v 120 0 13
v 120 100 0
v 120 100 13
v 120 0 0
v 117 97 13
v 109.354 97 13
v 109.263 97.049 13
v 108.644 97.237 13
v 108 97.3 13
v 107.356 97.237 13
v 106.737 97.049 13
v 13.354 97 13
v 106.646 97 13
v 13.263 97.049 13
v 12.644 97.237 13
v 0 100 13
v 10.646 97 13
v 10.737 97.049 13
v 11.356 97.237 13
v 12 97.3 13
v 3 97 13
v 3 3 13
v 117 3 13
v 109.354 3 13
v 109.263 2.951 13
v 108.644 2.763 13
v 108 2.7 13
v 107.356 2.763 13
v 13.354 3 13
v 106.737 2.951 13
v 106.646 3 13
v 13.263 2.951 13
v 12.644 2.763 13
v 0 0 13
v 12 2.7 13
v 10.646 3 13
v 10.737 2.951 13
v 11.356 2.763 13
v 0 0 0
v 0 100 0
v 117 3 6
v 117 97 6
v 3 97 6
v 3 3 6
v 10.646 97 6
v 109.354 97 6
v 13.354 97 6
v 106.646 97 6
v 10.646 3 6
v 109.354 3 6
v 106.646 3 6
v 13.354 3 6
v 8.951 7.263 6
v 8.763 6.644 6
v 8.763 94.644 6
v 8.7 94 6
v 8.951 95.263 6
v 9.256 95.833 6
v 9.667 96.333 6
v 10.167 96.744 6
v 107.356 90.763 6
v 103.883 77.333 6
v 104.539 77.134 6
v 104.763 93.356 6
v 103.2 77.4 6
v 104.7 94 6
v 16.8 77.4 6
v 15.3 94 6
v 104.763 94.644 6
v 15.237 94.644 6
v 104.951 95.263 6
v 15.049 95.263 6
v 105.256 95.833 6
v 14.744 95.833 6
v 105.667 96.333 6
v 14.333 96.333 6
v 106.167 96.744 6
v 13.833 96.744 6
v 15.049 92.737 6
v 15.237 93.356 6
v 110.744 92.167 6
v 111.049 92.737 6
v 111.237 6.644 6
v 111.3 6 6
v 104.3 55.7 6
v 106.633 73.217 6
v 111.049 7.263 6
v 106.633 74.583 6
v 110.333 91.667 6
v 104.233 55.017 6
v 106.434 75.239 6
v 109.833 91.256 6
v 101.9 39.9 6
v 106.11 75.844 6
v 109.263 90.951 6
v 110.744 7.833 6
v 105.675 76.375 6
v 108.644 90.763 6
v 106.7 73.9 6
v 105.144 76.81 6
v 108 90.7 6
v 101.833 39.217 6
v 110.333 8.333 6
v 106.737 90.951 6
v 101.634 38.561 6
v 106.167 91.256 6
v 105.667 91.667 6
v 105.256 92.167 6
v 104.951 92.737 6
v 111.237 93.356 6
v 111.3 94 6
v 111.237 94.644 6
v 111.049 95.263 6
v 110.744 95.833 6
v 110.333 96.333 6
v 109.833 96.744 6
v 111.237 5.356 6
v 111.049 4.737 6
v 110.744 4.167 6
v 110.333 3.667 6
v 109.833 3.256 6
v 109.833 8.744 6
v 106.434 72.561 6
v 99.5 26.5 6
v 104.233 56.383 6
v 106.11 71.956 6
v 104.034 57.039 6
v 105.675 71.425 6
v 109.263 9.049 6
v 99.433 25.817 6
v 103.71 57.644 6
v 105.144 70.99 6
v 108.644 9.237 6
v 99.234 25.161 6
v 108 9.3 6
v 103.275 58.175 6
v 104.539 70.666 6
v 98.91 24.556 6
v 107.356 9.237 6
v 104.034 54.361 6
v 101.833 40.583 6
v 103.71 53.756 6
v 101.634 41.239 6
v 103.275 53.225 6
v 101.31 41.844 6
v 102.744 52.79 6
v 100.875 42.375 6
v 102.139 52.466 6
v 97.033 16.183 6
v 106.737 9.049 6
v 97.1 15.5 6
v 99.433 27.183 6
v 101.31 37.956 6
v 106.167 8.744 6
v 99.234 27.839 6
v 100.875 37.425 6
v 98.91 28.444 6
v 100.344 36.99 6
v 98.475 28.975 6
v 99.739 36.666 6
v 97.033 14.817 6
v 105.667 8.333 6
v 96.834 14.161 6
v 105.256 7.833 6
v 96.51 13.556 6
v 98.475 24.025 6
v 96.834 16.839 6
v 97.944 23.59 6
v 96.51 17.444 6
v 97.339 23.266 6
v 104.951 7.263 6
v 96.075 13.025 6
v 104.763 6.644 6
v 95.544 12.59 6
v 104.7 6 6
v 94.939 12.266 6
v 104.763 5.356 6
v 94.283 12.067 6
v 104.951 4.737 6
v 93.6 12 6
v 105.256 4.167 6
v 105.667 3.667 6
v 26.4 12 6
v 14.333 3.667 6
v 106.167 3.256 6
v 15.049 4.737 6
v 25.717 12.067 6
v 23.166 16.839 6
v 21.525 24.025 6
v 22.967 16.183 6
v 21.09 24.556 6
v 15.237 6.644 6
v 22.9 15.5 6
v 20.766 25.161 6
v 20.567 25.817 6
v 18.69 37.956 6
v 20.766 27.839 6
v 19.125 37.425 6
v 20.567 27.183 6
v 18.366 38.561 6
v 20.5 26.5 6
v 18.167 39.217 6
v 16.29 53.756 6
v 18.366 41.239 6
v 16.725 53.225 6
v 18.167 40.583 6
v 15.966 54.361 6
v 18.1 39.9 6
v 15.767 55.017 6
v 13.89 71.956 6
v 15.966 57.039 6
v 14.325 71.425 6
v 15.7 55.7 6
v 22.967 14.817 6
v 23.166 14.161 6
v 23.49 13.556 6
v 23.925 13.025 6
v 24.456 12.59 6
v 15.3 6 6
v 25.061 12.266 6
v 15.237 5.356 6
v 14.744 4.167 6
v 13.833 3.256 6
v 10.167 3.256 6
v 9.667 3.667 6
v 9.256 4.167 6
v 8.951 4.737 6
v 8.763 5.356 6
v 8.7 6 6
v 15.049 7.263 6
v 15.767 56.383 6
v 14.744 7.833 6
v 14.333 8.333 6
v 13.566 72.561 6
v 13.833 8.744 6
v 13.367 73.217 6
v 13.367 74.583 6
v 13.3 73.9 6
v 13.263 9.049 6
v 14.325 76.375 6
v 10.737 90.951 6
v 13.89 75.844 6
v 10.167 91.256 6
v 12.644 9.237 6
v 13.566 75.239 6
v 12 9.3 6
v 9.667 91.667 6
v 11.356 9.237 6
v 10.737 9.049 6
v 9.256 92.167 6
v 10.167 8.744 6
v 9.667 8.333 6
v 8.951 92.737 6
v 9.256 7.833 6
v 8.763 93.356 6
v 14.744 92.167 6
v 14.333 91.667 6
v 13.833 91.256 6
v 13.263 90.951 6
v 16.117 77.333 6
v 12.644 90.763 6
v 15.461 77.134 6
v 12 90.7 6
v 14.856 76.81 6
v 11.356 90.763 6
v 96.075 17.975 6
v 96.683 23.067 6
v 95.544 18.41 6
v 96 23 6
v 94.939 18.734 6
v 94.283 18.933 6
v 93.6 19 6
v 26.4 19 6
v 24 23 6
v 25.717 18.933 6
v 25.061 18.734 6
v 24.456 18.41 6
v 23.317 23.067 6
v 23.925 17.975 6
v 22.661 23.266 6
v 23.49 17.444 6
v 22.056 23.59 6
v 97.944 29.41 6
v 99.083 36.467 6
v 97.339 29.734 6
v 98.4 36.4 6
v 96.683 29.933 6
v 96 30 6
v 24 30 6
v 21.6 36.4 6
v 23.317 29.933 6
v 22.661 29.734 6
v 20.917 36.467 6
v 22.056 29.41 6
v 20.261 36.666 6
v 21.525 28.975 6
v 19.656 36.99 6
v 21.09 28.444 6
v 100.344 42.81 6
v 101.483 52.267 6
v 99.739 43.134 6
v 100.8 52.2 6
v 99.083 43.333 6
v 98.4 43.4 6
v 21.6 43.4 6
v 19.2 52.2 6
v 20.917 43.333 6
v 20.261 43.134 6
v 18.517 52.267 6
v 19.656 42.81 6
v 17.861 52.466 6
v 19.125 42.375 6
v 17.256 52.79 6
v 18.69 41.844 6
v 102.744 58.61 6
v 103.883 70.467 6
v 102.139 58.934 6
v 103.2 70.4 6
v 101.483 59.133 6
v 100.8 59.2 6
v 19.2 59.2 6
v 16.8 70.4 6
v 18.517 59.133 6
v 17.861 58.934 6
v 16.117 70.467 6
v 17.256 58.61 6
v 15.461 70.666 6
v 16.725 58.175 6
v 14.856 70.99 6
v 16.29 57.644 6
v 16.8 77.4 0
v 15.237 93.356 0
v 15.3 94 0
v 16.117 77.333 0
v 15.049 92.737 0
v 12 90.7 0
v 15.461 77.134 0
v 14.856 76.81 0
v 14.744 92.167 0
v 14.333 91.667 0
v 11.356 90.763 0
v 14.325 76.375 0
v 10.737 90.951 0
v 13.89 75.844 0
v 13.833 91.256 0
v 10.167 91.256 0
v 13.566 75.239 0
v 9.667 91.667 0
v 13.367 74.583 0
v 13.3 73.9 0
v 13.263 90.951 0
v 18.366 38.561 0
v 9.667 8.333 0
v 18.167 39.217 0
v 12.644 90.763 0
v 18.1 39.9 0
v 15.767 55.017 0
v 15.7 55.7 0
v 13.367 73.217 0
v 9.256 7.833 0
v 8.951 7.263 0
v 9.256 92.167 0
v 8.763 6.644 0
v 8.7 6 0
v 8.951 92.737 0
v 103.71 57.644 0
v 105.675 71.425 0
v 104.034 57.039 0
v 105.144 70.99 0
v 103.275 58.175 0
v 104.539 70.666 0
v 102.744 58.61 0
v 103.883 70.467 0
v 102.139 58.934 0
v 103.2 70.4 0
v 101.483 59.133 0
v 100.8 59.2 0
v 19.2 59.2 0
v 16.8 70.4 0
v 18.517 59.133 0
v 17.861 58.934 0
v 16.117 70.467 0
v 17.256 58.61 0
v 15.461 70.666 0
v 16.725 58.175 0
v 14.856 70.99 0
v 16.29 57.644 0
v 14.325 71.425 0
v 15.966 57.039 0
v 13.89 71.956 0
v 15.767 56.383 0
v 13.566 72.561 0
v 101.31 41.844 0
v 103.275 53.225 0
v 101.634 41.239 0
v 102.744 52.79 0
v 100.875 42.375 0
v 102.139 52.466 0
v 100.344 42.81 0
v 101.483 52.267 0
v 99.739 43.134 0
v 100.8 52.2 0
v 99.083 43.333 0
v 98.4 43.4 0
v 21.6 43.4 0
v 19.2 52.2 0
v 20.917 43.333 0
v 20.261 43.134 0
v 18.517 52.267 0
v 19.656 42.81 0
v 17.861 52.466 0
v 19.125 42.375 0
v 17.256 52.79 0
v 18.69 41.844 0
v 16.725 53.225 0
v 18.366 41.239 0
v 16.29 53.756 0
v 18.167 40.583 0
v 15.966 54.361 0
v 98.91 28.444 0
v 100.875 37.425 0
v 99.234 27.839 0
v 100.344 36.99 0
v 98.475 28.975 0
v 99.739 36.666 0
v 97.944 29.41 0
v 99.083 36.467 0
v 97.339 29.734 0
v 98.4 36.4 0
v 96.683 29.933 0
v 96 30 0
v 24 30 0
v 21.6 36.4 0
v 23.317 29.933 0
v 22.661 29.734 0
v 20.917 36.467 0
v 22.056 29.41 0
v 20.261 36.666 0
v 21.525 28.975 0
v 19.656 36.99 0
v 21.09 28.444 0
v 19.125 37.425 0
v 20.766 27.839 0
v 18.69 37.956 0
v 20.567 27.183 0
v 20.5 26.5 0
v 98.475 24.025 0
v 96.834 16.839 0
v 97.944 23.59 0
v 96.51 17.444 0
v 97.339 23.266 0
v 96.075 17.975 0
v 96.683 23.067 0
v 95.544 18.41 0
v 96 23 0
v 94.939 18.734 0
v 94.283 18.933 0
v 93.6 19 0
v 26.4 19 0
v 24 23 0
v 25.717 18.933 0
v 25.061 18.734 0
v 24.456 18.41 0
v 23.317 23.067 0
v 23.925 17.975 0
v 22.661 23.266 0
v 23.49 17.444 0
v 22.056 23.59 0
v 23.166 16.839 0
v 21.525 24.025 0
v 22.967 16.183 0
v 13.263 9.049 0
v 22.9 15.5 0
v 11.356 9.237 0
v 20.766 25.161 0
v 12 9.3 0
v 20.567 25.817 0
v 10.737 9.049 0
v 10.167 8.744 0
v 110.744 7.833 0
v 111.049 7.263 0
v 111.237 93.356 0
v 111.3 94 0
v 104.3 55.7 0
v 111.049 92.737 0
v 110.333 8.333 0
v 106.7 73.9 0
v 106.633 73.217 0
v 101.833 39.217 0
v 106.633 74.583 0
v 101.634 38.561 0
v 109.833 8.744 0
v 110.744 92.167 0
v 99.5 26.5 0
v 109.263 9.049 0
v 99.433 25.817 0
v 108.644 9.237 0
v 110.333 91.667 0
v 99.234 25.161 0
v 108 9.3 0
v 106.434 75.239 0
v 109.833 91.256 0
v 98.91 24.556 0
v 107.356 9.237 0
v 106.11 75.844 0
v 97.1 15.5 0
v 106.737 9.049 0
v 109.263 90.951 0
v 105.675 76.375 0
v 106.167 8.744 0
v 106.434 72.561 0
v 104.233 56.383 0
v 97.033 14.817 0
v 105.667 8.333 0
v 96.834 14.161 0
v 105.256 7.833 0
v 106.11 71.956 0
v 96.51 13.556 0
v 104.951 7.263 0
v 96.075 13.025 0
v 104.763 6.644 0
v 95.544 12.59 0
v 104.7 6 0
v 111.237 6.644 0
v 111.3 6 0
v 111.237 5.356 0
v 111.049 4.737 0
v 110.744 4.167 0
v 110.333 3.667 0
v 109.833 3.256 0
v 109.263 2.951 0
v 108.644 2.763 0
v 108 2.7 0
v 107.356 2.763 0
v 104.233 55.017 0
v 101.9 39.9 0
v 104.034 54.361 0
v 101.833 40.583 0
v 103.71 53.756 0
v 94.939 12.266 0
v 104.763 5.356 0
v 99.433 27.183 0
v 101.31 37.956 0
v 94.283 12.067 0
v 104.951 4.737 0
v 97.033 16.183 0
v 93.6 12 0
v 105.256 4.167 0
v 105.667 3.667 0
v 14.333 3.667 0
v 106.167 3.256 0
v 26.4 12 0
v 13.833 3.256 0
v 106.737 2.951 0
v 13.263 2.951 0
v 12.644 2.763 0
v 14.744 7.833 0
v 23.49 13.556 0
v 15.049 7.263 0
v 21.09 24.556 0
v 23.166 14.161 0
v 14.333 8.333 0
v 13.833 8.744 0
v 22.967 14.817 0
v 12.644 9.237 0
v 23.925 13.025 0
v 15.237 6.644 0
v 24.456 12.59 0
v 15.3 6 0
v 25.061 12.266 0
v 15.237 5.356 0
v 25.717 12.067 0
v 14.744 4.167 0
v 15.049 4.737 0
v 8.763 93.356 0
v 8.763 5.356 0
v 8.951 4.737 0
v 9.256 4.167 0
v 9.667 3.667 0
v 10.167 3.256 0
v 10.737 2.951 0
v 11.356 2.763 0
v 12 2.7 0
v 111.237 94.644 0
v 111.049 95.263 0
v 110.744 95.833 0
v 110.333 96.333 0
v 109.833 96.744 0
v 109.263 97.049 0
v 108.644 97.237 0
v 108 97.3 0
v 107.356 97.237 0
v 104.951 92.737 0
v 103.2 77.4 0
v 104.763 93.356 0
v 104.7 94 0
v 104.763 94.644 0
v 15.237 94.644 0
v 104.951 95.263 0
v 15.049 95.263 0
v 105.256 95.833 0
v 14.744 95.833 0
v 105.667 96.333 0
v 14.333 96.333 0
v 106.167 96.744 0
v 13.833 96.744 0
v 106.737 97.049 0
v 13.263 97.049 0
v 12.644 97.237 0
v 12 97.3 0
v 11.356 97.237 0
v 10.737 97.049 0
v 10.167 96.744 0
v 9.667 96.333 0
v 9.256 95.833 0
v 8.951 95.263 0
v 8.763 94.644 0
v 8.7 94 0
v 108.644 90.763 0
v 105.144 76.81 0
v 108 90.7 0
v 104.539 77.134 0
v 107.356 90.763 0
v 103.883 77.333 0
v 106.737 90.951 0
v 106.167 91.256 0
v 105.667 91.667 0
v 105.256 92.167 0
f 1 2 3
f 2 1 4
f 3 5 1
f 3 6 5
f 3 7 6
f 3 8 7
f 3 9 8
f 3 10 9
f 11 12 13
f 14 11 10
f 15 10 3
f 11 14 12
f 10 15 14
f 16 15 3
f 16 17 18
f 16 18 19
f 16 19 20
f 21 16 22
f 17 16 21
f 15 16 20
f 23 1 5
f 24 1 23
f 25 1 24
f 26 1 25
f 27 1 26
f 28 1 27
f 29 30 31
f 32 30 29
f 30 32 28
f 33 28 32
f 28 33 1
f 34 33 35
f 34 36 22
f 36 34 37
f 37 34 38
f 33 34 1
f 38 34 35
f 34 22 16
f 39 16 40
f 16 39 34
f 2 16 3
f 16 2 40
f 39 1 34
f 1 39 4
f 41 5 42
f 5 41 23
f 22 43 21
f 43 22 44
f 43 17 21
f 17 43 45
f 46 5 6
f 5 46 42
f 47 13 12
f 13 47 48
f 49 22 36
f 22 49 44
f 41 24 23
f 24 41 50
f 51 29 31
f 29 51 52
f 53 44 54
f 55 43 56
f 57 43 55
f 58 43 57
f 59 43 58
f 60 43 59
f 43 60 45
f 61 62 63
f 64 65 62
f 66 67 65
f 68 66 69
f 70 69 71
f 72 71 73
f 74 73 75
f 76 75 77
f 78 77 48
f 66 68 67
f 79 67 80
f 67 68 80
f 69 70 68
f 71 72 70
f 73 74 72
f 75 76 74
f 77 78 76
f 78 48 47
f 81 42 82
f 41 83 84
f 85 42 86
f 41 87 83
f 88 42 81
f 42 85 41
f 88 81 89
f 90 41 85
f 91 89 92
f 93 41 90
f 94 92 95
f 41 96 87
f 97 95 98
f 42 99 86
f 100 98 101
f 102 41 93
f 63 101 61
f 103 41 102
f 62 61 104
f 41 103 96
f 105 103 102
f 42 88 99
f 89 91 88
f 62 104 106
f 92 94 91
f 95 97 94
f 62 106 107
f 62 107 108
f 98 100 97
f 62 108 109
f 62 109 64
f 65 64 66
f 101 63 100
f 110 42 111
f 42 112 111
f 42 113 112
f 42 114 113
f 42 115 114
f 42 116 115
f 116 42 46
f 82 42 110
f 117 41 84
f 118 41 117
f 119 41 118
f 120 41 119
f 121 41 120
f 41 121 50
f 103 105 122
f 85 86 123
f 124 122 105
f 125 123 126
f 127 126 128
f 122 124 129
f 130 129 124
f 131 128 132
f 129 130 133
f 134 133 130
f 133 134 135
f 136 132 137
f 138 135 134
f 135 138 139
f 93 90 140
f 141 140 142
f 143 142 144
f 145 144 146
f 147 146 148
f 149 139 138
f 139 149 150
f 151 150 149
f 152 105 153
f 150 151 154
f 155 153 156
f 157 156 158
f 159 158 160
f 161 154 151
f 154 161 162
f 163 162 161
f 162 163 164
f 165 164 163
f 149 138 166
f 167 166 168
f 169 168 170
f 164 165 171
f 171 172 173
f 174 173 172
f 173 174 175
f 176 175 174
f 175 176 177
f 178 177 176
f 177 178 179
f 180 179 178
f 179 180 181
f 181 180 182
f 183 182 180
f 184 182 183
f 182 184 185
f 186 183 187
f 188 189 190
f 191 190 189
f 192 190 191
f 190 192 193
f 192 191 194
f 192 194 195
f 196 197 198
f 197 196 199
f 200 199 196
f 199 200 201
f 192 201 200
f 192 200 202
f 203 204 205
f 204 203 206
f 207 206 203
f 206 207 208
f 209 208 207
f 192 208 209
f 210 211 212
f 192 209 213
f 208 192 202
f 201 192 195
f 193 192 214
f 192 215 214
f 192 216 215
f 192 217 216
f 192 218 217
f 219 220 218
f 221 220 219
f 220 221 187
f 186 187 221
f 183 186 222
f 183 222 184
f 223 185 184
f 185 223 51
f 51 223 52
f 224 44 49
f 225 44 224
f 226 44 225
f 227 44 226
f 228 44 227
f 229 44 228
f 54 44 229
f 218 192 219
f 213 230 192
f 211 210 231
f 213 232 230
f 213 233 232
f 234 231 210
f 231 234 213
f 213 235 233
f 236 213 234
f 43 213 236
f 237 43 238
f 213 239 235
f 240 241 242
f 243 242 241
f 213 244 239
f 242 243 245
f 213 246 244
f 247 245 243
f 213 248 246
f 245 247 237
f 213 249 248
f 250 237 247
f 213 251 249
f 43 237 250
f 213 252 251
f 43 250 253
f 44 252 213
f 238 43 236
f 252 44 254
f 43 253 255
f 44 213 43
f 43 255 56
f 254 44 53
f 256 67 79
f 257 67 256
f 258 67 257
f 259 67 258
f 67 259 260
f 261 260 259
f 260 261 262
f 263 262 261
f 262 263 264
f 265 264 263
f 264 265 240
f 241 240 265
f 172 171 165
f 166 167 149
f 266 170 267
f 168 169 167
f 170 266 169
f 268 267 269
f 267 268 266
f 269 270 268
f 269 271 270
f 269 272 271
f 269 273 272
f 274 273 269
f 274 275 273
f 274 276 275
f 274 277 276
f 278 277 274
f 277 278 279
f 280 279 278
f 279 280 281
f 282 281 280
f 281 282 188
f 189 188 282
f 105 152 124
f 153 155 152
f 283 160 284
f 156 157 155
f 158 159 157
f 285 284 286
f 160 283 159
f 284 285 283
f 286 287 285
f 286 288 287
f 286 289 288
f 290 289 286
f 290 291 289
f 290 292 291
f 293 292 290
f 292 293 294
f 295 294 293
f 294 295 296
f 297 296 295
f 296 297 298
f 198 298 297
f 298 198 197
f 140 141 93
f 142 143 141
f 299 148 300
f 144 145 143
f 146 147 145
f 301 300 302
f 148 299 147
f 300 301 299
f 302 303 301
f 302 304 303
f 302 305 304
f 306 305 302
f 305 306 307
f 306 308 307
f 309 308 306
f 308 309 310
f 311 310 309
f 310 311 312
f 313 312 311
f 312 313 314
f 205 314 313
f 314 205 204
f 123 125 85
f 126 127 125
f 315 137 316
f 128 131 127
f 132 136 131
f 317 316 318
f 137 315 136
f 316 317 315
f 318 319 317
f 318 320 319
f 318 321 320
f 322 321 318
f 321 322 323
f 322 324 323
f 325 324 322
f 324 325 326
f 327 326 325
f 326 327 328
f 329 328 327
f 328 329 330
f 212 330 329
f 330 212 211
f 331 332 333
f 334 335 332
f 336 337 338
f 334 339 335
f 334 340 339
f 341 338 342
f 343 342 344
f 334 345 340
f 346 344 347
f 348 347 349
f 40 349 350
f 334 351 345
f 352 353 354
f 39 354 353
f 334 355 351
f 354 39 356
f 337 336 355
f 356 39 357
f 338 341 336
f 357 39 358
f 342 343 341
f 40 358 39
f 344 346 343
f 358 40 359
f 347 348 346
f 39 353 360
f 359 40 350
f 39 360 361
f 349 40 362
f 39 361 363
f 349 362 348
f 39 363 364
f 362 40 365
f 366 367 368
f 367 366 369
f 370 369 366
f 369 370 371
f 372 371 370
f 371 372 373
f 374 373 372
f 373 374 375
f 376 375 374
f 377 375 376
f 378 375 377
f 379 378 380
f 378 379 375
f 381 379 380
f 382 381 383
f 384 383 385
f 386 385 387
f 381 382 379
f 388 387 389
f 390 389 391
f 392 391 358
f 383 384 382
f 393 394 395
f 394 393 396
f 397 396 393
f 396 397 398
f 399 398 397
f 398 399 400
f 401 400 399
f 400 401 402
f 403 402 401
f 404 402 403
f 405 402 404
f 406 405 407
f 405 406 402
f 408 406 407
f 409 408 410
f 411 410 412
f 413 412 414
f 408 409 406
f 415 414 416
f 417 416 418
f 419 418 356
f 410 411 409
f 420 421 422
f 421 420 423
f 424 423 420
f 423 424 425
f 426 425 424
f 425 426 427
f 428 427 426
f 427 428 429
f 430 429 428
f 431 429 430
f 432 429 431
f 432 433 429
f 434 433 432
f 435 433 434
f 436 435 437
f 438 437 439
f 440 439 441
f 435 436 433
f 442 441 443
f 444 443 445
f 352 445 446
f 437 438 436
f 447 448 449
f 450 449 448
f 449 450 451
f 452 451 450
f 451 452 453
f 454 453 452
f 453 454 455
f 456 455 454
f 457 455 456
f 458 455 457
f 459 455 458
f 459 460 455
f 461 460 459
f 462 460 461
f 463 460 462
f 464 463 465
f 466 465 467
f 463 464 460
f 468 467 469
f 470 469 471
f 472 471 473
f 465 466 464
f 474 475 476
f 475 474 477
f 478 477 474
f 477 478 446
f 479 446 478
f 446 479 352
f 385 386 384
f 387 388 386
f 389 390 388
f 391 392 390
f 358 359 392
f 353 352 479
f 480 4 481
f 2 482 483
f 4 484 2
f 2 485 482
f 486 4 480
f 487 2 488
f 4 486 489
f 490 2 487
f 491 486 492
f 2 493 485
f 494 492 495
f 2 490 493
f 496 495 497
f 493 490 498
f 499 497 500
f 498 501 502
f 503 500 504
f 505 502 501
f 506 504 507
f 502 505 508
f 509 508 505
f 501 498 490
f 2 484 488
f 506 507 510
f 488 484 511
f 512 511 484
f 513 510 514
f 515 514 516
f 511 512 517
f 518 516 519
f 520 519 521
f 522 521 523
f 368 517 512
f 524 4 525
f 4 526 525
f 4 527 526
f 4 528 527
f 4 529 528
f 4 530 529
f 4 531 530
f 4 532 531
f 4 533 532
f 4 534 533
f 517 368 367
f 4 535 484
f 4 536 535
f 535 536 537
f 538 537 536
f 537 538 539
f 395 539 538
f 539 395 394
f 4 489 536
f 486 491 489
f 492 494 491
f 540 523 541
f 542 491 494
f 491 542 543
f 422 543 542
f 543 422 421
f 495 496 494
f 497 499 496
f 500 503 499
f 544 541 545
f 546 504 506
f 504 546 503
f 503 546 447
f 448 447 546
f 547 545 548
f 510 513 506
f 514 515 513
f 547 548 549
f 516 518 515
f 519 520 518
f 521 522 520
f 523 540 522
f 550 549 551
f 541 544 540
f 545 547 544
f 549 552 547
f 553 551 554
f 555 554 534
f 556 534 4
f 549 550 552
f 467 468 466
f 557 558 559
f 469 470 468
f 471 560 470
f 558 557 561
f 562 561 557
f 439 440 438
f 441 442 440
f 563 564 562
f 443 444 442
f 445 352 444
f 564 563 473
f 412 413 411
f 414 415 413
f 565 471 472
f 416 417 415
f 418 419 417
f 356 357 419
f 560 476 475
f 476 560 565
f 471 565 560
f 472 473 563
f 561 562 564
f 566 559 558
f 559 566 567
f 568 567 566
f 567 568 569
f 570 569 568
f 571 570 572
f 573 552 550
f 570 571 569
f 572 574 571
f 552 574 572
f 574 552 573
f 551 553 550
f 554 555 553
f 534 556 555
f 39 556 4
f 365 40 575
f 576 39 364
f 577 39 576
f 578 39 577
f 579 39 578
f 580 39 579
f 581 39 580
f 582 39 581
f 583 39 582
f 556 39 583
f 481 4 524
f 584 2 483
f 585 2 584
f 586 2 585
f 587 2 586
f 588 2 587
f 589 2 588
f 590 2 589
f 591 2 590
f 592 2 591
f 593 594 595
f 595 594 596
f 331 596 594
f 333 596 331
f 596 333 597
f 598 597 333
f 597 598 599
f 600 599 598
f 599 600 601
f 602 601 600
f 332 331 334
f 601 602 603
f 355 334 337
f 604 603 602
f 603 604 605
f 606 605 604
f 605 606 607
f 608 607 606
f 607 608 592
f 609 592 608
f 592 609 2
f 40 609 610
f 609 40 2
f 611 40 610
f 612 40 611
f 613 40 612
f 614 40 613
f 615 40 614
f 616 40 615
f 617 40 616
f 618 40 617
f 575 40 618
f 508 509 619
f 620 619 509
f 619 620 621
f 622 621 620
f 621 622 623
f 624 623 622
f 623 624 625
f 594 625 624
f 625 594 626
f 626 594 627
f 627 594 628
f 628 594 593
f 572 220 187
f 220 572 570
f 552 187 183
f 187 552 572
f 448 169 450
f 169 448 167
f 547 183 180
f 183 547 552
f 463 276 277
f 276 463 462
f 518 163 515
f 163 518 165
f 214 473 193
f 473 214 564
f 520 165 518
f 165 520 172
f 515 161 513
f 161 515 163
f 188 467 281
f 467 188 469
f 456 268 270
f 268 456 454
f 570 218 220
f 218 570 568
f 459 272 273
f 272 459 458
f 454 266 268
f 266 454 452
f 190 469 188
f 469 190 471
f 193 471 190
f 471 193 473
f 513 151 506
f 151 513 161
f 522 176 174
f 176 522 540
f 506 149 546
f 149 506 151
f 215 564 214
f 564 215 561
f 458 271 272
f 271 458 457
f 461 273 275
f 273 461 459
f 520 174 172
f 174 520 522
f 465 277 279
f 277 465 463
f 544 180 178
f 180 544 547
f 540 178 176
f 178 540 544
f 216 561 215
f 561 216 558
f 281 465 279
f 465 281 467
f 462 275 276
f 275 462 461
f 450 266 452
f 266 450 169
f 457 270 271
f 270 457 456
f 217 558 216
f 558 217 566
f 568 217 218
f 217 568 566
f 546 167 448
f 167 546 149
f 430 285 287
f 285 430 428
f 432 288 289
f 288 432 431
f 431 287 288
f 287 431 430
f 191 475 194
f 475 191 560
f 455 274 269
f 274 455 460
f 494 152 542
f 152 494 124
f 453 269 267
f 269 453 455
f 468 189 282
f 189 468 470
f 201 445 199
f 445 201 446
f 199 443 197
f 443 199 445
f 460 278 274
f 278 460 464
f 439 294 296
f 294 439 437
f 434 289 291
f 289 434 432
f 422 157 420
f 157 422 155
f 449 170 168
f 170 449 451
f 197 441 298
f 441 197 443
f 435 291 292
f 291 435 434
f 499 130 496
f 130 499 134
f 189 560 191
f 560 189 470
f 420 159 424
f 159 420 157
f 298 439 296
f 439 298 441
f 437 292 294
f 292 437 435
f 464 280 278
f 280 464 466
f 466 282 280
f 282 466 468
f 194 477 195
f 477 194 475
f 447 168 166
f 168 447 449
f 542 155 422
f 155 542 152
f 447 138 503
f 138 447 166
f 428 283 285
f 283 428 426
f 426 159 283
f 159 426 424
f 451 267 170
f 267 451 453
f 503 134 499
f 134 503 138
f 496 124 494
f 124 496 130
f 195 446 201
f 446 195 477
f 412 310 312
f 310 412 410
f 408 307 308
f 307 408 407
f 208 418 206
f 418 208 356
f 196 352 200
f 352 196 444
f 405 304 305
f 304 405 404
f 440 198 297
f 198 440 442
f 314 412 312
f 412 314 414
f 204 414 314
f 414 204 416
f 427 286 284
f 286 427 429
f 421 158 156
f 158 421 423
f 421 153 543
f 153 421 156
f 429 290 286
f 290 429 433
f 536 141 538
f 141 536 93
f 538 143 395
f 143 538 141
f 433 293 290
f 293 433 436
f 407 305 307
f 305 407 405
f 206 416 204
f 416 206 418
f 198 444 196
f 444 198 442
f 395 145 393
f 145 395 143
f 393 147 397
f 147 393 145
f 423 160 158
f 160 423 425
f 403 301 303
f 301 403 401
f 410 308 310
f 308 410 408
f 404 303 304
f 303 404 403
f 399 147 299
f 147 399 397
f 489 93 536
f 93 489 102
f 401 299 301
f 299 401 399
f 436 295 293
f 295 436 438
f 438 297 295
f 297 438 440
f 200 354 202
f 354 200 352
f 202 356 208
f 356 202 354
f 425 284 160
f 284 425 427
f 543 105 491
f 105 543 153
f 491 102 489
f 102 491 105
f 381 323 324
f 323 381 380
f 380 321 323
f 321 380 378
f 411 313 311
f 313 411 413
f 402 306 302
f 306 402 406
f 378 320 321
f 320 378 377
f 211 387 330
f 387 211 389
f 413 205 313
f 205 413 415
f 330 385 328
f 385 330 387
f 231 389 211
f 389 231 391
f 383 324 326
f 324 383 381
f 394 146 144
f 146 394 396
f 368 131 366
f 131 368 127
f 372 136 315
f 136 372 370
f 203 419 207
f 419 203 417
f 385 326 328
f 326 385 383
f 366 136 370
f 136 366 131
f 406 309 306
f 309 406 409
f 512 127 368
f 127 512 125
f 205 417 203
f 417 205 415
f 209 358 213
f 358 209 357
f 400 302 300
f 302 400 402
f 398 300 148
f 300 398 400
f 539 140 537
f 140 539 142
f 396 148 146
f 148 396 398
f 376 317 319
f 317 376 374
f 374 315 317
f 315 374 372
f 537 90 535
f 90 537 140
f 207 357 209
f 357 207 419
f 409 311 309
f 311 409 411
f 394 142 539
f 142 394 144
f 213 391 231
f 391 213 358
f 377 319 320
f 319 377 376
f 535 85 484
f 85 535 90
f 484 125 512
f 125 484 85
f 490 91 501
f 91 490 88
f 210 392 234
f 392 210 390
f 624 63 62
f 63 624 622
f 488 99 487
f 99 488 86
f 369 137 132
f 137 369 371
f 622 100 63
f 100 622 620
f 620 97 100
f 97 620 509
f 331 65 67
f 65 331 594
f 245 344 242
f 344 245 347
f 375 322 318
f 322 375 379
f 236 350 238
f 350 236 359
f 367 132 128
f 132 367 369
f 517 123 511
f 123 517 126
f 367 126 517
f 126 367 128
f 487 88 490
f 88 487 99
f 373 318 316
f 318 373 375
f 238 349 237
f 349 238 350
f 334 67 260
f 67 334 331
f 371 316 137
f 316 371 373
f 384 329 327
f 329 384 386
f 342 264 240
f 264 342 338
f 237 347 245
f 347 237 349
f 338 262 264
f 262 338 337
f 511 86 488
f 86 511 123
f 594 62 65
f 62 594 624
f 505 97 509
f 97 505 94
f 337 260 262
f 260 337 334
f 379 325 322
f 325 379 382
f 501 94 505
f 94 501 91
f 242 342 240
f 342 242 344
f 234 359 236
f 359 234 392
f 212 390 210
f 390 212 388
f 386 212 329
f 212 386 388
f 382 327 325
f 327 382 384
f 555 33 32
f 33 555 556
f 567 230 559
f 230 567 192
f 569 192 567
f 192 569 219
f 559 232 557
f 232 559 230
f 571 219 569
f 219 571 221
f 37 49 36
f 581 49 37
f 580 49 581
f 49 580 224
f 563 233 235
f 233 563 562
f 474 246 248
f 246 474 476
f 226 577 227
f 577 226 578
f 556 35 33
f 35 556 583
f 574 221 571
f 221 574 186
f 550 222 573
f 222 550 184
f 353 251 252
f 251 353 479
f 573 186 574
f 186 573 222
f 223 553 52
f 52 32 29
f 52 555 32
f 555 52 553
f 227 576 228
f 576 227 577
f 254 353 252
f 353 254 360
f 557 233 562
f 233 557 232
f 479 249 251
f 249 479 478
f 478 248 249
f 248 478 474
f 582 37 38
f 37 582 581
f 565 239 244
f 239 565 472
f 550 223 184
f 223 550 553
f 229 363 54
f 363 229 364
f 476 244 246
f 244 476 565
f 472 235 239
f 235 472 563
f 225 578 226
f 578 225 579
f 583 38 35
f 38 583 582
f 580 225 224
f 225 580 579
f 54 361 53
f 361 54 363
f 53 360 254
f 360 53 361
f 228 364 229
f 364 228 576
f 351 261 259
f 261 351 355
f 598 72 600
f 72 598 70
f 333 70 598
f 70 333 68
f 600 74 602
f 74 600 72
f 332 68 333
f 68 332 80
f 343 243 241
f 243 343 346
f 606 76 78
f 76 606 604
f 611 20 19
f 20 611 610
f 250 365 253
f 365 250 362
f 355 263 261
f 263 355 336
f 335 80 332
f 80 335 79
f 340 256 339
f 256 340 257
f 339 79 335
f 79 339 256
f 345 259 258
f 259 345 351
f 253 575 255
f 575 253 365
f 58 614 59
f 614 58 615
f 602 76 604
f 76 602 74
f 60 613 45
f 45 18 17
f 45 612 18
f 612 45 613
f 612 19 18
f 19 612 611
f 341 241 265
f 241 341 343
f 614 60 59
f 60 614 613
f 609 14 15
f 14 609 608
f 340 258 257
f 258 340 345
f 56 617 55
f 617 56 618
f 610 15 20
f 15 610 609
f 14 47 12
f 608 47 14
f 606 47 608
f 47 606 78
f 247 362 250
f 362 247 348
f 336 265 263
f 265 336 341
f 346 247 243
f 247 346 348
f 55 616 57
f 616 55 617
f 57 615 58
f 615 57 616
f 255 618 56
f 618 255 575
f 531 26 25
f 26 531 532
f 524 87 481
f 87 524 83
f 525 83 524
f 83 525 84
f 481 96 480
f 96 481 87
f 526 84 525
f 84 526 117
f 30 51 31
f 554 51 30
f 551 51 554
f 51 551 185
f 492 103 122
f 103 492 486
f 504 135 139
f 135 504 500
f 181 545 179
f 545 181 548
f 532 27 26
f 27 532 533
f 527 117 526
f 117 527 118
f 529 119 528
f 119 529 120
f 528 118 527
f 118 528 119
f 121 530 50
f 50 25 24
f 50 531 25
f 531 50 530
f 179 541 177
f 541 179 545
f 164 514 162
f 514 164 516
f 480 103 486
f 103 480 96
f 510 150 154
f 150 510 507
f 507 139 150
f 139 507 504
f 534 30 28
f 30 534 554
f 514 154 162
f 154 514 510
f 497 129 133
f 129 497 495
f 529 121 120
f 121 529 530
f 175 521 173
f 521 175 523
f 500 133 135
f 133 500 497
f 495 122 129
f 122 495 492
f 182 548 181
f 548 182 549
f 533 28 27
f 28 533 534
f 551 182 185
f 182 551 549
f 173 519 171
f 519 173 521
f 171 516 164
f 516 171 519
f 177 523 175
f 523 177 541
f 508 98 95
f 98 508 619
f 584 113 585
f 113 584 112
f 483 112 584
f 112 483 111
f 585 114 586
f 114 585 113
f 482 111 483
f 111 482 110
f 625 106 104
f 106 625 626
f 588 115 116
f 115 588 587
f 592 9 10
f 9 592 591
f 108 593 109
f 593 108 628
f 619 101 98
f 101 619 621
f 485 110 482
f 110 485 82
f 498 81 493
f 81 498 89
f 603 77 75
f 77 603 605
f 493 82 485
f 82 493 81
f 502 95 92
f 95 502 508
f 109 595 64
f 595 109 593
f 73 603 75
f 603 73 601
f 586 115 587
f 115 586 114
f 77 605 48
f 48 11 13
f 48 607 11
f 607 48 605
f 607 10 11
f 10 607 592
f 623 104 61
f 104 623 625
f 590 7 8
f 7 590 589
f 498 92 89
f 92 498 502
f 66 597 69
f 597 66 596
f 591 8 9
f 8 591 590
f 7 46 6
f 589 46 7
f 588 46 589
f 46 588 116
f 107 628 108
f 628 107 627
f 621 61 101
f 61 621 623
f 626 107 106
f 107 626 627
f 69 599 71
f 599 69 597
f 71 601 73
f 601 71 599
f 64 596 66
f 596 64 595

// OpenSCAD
$fn = 32;

// ----------------------------------------------------------------------
// Slotted panel: 120 x 100 mm, 5 рядов of slots
// ----------------------------------------------------------------------

// --- parameters (mm) ---
panel_w = 120;            // panel width
panel_d = 100;            // panel depth
thick = 6;                // panel thickness
slot_w = 7;               // slot width
pitch0 = 11;              // first row pitch
pitch_step = 2.4;         // pitch increase per row
margin = 12;              // margin around the slot field
rows = 5;                 // number of slot rows
mount_d = 6.6;            // mounting holes
mount_x = 48;             // mounting hole offset
rim_h = 13;               // rim height
rim_t = 3;                // rim wall thickness

difference() {
  union() {
    cube([panel_w, panel_d, thick]);
    translate([0, 0, thick - 1]) difference() {
      cube([panel_w, panel_d, rim_h - thick + 1]);
      translate([rim_t, rim_t, -2.5]) cube([panel_w - 2 * rim_t, panel_d - 2 * rim_t, rim_h - thick + 6]);
    }
  }
  /* slot rows: stadium shaped cutters, 2.5 mm clear of both faces */
  /* row 0: pitch 11, length 67.2 */
  hull() {
    translate([26.4, 15.5, -2.5]) cylinder(h = thick + 5, d = slot_w);
    translate([93.6, 15.5, -2.5]) cylinder(h = thick + 5, d = slot_w);
  }
  /* row 1: pitch 13.4, length 72 */
  hull() {
    translate([24, 26.5, -2.5]) cylinder(h = thick + 5, d = slot_w);
    translate([96, 26.5, -2.5]) cylinder(h = thick + 5, d = slot_w);
  }
  /* row 2: pitch 15.8, length 76.8 */
  hull() {
    translate([21.6, 39.9, -2.5]) cylinder(h = thick + 5, d = slot_w);
    translate([98.4, 39.9, -2.5]) cylinder(h = thick + 5, d = slot_w);
  }
  /* row 3: pitch 18.2, length 81.6 */
  hull() {
    translate([19.2, 55.7, -2.5]) cylinder(h = thick + 5, d = slot_w);
    translate([100.8, 55.7, -2.5]) cylinder(h = thick + 5, d = slot_w);
  }
  /* row 4: pitch 20.6, length 86.4 */
  hull() {
    translate([16.8, 73.9, -2.5]) cylinder(h = thick + 5, d = slot_w);
    translate([103.2, 73.9, -2.5]) cylinder(h = thick + 5, d = slot_w);
  }
  translate([12, 6, -2.5]) cylinder(h = 18, d = mount_d);
  translate([12, 94, -2.5]) cylinder(h = 18, d = mount_d);
  translate([108, 6, -2.5]) cylinder(h = 18, d = mount_d);
  translate([108, 94, -2.5]) cylinder(h = 18, d = mount_d);
}
